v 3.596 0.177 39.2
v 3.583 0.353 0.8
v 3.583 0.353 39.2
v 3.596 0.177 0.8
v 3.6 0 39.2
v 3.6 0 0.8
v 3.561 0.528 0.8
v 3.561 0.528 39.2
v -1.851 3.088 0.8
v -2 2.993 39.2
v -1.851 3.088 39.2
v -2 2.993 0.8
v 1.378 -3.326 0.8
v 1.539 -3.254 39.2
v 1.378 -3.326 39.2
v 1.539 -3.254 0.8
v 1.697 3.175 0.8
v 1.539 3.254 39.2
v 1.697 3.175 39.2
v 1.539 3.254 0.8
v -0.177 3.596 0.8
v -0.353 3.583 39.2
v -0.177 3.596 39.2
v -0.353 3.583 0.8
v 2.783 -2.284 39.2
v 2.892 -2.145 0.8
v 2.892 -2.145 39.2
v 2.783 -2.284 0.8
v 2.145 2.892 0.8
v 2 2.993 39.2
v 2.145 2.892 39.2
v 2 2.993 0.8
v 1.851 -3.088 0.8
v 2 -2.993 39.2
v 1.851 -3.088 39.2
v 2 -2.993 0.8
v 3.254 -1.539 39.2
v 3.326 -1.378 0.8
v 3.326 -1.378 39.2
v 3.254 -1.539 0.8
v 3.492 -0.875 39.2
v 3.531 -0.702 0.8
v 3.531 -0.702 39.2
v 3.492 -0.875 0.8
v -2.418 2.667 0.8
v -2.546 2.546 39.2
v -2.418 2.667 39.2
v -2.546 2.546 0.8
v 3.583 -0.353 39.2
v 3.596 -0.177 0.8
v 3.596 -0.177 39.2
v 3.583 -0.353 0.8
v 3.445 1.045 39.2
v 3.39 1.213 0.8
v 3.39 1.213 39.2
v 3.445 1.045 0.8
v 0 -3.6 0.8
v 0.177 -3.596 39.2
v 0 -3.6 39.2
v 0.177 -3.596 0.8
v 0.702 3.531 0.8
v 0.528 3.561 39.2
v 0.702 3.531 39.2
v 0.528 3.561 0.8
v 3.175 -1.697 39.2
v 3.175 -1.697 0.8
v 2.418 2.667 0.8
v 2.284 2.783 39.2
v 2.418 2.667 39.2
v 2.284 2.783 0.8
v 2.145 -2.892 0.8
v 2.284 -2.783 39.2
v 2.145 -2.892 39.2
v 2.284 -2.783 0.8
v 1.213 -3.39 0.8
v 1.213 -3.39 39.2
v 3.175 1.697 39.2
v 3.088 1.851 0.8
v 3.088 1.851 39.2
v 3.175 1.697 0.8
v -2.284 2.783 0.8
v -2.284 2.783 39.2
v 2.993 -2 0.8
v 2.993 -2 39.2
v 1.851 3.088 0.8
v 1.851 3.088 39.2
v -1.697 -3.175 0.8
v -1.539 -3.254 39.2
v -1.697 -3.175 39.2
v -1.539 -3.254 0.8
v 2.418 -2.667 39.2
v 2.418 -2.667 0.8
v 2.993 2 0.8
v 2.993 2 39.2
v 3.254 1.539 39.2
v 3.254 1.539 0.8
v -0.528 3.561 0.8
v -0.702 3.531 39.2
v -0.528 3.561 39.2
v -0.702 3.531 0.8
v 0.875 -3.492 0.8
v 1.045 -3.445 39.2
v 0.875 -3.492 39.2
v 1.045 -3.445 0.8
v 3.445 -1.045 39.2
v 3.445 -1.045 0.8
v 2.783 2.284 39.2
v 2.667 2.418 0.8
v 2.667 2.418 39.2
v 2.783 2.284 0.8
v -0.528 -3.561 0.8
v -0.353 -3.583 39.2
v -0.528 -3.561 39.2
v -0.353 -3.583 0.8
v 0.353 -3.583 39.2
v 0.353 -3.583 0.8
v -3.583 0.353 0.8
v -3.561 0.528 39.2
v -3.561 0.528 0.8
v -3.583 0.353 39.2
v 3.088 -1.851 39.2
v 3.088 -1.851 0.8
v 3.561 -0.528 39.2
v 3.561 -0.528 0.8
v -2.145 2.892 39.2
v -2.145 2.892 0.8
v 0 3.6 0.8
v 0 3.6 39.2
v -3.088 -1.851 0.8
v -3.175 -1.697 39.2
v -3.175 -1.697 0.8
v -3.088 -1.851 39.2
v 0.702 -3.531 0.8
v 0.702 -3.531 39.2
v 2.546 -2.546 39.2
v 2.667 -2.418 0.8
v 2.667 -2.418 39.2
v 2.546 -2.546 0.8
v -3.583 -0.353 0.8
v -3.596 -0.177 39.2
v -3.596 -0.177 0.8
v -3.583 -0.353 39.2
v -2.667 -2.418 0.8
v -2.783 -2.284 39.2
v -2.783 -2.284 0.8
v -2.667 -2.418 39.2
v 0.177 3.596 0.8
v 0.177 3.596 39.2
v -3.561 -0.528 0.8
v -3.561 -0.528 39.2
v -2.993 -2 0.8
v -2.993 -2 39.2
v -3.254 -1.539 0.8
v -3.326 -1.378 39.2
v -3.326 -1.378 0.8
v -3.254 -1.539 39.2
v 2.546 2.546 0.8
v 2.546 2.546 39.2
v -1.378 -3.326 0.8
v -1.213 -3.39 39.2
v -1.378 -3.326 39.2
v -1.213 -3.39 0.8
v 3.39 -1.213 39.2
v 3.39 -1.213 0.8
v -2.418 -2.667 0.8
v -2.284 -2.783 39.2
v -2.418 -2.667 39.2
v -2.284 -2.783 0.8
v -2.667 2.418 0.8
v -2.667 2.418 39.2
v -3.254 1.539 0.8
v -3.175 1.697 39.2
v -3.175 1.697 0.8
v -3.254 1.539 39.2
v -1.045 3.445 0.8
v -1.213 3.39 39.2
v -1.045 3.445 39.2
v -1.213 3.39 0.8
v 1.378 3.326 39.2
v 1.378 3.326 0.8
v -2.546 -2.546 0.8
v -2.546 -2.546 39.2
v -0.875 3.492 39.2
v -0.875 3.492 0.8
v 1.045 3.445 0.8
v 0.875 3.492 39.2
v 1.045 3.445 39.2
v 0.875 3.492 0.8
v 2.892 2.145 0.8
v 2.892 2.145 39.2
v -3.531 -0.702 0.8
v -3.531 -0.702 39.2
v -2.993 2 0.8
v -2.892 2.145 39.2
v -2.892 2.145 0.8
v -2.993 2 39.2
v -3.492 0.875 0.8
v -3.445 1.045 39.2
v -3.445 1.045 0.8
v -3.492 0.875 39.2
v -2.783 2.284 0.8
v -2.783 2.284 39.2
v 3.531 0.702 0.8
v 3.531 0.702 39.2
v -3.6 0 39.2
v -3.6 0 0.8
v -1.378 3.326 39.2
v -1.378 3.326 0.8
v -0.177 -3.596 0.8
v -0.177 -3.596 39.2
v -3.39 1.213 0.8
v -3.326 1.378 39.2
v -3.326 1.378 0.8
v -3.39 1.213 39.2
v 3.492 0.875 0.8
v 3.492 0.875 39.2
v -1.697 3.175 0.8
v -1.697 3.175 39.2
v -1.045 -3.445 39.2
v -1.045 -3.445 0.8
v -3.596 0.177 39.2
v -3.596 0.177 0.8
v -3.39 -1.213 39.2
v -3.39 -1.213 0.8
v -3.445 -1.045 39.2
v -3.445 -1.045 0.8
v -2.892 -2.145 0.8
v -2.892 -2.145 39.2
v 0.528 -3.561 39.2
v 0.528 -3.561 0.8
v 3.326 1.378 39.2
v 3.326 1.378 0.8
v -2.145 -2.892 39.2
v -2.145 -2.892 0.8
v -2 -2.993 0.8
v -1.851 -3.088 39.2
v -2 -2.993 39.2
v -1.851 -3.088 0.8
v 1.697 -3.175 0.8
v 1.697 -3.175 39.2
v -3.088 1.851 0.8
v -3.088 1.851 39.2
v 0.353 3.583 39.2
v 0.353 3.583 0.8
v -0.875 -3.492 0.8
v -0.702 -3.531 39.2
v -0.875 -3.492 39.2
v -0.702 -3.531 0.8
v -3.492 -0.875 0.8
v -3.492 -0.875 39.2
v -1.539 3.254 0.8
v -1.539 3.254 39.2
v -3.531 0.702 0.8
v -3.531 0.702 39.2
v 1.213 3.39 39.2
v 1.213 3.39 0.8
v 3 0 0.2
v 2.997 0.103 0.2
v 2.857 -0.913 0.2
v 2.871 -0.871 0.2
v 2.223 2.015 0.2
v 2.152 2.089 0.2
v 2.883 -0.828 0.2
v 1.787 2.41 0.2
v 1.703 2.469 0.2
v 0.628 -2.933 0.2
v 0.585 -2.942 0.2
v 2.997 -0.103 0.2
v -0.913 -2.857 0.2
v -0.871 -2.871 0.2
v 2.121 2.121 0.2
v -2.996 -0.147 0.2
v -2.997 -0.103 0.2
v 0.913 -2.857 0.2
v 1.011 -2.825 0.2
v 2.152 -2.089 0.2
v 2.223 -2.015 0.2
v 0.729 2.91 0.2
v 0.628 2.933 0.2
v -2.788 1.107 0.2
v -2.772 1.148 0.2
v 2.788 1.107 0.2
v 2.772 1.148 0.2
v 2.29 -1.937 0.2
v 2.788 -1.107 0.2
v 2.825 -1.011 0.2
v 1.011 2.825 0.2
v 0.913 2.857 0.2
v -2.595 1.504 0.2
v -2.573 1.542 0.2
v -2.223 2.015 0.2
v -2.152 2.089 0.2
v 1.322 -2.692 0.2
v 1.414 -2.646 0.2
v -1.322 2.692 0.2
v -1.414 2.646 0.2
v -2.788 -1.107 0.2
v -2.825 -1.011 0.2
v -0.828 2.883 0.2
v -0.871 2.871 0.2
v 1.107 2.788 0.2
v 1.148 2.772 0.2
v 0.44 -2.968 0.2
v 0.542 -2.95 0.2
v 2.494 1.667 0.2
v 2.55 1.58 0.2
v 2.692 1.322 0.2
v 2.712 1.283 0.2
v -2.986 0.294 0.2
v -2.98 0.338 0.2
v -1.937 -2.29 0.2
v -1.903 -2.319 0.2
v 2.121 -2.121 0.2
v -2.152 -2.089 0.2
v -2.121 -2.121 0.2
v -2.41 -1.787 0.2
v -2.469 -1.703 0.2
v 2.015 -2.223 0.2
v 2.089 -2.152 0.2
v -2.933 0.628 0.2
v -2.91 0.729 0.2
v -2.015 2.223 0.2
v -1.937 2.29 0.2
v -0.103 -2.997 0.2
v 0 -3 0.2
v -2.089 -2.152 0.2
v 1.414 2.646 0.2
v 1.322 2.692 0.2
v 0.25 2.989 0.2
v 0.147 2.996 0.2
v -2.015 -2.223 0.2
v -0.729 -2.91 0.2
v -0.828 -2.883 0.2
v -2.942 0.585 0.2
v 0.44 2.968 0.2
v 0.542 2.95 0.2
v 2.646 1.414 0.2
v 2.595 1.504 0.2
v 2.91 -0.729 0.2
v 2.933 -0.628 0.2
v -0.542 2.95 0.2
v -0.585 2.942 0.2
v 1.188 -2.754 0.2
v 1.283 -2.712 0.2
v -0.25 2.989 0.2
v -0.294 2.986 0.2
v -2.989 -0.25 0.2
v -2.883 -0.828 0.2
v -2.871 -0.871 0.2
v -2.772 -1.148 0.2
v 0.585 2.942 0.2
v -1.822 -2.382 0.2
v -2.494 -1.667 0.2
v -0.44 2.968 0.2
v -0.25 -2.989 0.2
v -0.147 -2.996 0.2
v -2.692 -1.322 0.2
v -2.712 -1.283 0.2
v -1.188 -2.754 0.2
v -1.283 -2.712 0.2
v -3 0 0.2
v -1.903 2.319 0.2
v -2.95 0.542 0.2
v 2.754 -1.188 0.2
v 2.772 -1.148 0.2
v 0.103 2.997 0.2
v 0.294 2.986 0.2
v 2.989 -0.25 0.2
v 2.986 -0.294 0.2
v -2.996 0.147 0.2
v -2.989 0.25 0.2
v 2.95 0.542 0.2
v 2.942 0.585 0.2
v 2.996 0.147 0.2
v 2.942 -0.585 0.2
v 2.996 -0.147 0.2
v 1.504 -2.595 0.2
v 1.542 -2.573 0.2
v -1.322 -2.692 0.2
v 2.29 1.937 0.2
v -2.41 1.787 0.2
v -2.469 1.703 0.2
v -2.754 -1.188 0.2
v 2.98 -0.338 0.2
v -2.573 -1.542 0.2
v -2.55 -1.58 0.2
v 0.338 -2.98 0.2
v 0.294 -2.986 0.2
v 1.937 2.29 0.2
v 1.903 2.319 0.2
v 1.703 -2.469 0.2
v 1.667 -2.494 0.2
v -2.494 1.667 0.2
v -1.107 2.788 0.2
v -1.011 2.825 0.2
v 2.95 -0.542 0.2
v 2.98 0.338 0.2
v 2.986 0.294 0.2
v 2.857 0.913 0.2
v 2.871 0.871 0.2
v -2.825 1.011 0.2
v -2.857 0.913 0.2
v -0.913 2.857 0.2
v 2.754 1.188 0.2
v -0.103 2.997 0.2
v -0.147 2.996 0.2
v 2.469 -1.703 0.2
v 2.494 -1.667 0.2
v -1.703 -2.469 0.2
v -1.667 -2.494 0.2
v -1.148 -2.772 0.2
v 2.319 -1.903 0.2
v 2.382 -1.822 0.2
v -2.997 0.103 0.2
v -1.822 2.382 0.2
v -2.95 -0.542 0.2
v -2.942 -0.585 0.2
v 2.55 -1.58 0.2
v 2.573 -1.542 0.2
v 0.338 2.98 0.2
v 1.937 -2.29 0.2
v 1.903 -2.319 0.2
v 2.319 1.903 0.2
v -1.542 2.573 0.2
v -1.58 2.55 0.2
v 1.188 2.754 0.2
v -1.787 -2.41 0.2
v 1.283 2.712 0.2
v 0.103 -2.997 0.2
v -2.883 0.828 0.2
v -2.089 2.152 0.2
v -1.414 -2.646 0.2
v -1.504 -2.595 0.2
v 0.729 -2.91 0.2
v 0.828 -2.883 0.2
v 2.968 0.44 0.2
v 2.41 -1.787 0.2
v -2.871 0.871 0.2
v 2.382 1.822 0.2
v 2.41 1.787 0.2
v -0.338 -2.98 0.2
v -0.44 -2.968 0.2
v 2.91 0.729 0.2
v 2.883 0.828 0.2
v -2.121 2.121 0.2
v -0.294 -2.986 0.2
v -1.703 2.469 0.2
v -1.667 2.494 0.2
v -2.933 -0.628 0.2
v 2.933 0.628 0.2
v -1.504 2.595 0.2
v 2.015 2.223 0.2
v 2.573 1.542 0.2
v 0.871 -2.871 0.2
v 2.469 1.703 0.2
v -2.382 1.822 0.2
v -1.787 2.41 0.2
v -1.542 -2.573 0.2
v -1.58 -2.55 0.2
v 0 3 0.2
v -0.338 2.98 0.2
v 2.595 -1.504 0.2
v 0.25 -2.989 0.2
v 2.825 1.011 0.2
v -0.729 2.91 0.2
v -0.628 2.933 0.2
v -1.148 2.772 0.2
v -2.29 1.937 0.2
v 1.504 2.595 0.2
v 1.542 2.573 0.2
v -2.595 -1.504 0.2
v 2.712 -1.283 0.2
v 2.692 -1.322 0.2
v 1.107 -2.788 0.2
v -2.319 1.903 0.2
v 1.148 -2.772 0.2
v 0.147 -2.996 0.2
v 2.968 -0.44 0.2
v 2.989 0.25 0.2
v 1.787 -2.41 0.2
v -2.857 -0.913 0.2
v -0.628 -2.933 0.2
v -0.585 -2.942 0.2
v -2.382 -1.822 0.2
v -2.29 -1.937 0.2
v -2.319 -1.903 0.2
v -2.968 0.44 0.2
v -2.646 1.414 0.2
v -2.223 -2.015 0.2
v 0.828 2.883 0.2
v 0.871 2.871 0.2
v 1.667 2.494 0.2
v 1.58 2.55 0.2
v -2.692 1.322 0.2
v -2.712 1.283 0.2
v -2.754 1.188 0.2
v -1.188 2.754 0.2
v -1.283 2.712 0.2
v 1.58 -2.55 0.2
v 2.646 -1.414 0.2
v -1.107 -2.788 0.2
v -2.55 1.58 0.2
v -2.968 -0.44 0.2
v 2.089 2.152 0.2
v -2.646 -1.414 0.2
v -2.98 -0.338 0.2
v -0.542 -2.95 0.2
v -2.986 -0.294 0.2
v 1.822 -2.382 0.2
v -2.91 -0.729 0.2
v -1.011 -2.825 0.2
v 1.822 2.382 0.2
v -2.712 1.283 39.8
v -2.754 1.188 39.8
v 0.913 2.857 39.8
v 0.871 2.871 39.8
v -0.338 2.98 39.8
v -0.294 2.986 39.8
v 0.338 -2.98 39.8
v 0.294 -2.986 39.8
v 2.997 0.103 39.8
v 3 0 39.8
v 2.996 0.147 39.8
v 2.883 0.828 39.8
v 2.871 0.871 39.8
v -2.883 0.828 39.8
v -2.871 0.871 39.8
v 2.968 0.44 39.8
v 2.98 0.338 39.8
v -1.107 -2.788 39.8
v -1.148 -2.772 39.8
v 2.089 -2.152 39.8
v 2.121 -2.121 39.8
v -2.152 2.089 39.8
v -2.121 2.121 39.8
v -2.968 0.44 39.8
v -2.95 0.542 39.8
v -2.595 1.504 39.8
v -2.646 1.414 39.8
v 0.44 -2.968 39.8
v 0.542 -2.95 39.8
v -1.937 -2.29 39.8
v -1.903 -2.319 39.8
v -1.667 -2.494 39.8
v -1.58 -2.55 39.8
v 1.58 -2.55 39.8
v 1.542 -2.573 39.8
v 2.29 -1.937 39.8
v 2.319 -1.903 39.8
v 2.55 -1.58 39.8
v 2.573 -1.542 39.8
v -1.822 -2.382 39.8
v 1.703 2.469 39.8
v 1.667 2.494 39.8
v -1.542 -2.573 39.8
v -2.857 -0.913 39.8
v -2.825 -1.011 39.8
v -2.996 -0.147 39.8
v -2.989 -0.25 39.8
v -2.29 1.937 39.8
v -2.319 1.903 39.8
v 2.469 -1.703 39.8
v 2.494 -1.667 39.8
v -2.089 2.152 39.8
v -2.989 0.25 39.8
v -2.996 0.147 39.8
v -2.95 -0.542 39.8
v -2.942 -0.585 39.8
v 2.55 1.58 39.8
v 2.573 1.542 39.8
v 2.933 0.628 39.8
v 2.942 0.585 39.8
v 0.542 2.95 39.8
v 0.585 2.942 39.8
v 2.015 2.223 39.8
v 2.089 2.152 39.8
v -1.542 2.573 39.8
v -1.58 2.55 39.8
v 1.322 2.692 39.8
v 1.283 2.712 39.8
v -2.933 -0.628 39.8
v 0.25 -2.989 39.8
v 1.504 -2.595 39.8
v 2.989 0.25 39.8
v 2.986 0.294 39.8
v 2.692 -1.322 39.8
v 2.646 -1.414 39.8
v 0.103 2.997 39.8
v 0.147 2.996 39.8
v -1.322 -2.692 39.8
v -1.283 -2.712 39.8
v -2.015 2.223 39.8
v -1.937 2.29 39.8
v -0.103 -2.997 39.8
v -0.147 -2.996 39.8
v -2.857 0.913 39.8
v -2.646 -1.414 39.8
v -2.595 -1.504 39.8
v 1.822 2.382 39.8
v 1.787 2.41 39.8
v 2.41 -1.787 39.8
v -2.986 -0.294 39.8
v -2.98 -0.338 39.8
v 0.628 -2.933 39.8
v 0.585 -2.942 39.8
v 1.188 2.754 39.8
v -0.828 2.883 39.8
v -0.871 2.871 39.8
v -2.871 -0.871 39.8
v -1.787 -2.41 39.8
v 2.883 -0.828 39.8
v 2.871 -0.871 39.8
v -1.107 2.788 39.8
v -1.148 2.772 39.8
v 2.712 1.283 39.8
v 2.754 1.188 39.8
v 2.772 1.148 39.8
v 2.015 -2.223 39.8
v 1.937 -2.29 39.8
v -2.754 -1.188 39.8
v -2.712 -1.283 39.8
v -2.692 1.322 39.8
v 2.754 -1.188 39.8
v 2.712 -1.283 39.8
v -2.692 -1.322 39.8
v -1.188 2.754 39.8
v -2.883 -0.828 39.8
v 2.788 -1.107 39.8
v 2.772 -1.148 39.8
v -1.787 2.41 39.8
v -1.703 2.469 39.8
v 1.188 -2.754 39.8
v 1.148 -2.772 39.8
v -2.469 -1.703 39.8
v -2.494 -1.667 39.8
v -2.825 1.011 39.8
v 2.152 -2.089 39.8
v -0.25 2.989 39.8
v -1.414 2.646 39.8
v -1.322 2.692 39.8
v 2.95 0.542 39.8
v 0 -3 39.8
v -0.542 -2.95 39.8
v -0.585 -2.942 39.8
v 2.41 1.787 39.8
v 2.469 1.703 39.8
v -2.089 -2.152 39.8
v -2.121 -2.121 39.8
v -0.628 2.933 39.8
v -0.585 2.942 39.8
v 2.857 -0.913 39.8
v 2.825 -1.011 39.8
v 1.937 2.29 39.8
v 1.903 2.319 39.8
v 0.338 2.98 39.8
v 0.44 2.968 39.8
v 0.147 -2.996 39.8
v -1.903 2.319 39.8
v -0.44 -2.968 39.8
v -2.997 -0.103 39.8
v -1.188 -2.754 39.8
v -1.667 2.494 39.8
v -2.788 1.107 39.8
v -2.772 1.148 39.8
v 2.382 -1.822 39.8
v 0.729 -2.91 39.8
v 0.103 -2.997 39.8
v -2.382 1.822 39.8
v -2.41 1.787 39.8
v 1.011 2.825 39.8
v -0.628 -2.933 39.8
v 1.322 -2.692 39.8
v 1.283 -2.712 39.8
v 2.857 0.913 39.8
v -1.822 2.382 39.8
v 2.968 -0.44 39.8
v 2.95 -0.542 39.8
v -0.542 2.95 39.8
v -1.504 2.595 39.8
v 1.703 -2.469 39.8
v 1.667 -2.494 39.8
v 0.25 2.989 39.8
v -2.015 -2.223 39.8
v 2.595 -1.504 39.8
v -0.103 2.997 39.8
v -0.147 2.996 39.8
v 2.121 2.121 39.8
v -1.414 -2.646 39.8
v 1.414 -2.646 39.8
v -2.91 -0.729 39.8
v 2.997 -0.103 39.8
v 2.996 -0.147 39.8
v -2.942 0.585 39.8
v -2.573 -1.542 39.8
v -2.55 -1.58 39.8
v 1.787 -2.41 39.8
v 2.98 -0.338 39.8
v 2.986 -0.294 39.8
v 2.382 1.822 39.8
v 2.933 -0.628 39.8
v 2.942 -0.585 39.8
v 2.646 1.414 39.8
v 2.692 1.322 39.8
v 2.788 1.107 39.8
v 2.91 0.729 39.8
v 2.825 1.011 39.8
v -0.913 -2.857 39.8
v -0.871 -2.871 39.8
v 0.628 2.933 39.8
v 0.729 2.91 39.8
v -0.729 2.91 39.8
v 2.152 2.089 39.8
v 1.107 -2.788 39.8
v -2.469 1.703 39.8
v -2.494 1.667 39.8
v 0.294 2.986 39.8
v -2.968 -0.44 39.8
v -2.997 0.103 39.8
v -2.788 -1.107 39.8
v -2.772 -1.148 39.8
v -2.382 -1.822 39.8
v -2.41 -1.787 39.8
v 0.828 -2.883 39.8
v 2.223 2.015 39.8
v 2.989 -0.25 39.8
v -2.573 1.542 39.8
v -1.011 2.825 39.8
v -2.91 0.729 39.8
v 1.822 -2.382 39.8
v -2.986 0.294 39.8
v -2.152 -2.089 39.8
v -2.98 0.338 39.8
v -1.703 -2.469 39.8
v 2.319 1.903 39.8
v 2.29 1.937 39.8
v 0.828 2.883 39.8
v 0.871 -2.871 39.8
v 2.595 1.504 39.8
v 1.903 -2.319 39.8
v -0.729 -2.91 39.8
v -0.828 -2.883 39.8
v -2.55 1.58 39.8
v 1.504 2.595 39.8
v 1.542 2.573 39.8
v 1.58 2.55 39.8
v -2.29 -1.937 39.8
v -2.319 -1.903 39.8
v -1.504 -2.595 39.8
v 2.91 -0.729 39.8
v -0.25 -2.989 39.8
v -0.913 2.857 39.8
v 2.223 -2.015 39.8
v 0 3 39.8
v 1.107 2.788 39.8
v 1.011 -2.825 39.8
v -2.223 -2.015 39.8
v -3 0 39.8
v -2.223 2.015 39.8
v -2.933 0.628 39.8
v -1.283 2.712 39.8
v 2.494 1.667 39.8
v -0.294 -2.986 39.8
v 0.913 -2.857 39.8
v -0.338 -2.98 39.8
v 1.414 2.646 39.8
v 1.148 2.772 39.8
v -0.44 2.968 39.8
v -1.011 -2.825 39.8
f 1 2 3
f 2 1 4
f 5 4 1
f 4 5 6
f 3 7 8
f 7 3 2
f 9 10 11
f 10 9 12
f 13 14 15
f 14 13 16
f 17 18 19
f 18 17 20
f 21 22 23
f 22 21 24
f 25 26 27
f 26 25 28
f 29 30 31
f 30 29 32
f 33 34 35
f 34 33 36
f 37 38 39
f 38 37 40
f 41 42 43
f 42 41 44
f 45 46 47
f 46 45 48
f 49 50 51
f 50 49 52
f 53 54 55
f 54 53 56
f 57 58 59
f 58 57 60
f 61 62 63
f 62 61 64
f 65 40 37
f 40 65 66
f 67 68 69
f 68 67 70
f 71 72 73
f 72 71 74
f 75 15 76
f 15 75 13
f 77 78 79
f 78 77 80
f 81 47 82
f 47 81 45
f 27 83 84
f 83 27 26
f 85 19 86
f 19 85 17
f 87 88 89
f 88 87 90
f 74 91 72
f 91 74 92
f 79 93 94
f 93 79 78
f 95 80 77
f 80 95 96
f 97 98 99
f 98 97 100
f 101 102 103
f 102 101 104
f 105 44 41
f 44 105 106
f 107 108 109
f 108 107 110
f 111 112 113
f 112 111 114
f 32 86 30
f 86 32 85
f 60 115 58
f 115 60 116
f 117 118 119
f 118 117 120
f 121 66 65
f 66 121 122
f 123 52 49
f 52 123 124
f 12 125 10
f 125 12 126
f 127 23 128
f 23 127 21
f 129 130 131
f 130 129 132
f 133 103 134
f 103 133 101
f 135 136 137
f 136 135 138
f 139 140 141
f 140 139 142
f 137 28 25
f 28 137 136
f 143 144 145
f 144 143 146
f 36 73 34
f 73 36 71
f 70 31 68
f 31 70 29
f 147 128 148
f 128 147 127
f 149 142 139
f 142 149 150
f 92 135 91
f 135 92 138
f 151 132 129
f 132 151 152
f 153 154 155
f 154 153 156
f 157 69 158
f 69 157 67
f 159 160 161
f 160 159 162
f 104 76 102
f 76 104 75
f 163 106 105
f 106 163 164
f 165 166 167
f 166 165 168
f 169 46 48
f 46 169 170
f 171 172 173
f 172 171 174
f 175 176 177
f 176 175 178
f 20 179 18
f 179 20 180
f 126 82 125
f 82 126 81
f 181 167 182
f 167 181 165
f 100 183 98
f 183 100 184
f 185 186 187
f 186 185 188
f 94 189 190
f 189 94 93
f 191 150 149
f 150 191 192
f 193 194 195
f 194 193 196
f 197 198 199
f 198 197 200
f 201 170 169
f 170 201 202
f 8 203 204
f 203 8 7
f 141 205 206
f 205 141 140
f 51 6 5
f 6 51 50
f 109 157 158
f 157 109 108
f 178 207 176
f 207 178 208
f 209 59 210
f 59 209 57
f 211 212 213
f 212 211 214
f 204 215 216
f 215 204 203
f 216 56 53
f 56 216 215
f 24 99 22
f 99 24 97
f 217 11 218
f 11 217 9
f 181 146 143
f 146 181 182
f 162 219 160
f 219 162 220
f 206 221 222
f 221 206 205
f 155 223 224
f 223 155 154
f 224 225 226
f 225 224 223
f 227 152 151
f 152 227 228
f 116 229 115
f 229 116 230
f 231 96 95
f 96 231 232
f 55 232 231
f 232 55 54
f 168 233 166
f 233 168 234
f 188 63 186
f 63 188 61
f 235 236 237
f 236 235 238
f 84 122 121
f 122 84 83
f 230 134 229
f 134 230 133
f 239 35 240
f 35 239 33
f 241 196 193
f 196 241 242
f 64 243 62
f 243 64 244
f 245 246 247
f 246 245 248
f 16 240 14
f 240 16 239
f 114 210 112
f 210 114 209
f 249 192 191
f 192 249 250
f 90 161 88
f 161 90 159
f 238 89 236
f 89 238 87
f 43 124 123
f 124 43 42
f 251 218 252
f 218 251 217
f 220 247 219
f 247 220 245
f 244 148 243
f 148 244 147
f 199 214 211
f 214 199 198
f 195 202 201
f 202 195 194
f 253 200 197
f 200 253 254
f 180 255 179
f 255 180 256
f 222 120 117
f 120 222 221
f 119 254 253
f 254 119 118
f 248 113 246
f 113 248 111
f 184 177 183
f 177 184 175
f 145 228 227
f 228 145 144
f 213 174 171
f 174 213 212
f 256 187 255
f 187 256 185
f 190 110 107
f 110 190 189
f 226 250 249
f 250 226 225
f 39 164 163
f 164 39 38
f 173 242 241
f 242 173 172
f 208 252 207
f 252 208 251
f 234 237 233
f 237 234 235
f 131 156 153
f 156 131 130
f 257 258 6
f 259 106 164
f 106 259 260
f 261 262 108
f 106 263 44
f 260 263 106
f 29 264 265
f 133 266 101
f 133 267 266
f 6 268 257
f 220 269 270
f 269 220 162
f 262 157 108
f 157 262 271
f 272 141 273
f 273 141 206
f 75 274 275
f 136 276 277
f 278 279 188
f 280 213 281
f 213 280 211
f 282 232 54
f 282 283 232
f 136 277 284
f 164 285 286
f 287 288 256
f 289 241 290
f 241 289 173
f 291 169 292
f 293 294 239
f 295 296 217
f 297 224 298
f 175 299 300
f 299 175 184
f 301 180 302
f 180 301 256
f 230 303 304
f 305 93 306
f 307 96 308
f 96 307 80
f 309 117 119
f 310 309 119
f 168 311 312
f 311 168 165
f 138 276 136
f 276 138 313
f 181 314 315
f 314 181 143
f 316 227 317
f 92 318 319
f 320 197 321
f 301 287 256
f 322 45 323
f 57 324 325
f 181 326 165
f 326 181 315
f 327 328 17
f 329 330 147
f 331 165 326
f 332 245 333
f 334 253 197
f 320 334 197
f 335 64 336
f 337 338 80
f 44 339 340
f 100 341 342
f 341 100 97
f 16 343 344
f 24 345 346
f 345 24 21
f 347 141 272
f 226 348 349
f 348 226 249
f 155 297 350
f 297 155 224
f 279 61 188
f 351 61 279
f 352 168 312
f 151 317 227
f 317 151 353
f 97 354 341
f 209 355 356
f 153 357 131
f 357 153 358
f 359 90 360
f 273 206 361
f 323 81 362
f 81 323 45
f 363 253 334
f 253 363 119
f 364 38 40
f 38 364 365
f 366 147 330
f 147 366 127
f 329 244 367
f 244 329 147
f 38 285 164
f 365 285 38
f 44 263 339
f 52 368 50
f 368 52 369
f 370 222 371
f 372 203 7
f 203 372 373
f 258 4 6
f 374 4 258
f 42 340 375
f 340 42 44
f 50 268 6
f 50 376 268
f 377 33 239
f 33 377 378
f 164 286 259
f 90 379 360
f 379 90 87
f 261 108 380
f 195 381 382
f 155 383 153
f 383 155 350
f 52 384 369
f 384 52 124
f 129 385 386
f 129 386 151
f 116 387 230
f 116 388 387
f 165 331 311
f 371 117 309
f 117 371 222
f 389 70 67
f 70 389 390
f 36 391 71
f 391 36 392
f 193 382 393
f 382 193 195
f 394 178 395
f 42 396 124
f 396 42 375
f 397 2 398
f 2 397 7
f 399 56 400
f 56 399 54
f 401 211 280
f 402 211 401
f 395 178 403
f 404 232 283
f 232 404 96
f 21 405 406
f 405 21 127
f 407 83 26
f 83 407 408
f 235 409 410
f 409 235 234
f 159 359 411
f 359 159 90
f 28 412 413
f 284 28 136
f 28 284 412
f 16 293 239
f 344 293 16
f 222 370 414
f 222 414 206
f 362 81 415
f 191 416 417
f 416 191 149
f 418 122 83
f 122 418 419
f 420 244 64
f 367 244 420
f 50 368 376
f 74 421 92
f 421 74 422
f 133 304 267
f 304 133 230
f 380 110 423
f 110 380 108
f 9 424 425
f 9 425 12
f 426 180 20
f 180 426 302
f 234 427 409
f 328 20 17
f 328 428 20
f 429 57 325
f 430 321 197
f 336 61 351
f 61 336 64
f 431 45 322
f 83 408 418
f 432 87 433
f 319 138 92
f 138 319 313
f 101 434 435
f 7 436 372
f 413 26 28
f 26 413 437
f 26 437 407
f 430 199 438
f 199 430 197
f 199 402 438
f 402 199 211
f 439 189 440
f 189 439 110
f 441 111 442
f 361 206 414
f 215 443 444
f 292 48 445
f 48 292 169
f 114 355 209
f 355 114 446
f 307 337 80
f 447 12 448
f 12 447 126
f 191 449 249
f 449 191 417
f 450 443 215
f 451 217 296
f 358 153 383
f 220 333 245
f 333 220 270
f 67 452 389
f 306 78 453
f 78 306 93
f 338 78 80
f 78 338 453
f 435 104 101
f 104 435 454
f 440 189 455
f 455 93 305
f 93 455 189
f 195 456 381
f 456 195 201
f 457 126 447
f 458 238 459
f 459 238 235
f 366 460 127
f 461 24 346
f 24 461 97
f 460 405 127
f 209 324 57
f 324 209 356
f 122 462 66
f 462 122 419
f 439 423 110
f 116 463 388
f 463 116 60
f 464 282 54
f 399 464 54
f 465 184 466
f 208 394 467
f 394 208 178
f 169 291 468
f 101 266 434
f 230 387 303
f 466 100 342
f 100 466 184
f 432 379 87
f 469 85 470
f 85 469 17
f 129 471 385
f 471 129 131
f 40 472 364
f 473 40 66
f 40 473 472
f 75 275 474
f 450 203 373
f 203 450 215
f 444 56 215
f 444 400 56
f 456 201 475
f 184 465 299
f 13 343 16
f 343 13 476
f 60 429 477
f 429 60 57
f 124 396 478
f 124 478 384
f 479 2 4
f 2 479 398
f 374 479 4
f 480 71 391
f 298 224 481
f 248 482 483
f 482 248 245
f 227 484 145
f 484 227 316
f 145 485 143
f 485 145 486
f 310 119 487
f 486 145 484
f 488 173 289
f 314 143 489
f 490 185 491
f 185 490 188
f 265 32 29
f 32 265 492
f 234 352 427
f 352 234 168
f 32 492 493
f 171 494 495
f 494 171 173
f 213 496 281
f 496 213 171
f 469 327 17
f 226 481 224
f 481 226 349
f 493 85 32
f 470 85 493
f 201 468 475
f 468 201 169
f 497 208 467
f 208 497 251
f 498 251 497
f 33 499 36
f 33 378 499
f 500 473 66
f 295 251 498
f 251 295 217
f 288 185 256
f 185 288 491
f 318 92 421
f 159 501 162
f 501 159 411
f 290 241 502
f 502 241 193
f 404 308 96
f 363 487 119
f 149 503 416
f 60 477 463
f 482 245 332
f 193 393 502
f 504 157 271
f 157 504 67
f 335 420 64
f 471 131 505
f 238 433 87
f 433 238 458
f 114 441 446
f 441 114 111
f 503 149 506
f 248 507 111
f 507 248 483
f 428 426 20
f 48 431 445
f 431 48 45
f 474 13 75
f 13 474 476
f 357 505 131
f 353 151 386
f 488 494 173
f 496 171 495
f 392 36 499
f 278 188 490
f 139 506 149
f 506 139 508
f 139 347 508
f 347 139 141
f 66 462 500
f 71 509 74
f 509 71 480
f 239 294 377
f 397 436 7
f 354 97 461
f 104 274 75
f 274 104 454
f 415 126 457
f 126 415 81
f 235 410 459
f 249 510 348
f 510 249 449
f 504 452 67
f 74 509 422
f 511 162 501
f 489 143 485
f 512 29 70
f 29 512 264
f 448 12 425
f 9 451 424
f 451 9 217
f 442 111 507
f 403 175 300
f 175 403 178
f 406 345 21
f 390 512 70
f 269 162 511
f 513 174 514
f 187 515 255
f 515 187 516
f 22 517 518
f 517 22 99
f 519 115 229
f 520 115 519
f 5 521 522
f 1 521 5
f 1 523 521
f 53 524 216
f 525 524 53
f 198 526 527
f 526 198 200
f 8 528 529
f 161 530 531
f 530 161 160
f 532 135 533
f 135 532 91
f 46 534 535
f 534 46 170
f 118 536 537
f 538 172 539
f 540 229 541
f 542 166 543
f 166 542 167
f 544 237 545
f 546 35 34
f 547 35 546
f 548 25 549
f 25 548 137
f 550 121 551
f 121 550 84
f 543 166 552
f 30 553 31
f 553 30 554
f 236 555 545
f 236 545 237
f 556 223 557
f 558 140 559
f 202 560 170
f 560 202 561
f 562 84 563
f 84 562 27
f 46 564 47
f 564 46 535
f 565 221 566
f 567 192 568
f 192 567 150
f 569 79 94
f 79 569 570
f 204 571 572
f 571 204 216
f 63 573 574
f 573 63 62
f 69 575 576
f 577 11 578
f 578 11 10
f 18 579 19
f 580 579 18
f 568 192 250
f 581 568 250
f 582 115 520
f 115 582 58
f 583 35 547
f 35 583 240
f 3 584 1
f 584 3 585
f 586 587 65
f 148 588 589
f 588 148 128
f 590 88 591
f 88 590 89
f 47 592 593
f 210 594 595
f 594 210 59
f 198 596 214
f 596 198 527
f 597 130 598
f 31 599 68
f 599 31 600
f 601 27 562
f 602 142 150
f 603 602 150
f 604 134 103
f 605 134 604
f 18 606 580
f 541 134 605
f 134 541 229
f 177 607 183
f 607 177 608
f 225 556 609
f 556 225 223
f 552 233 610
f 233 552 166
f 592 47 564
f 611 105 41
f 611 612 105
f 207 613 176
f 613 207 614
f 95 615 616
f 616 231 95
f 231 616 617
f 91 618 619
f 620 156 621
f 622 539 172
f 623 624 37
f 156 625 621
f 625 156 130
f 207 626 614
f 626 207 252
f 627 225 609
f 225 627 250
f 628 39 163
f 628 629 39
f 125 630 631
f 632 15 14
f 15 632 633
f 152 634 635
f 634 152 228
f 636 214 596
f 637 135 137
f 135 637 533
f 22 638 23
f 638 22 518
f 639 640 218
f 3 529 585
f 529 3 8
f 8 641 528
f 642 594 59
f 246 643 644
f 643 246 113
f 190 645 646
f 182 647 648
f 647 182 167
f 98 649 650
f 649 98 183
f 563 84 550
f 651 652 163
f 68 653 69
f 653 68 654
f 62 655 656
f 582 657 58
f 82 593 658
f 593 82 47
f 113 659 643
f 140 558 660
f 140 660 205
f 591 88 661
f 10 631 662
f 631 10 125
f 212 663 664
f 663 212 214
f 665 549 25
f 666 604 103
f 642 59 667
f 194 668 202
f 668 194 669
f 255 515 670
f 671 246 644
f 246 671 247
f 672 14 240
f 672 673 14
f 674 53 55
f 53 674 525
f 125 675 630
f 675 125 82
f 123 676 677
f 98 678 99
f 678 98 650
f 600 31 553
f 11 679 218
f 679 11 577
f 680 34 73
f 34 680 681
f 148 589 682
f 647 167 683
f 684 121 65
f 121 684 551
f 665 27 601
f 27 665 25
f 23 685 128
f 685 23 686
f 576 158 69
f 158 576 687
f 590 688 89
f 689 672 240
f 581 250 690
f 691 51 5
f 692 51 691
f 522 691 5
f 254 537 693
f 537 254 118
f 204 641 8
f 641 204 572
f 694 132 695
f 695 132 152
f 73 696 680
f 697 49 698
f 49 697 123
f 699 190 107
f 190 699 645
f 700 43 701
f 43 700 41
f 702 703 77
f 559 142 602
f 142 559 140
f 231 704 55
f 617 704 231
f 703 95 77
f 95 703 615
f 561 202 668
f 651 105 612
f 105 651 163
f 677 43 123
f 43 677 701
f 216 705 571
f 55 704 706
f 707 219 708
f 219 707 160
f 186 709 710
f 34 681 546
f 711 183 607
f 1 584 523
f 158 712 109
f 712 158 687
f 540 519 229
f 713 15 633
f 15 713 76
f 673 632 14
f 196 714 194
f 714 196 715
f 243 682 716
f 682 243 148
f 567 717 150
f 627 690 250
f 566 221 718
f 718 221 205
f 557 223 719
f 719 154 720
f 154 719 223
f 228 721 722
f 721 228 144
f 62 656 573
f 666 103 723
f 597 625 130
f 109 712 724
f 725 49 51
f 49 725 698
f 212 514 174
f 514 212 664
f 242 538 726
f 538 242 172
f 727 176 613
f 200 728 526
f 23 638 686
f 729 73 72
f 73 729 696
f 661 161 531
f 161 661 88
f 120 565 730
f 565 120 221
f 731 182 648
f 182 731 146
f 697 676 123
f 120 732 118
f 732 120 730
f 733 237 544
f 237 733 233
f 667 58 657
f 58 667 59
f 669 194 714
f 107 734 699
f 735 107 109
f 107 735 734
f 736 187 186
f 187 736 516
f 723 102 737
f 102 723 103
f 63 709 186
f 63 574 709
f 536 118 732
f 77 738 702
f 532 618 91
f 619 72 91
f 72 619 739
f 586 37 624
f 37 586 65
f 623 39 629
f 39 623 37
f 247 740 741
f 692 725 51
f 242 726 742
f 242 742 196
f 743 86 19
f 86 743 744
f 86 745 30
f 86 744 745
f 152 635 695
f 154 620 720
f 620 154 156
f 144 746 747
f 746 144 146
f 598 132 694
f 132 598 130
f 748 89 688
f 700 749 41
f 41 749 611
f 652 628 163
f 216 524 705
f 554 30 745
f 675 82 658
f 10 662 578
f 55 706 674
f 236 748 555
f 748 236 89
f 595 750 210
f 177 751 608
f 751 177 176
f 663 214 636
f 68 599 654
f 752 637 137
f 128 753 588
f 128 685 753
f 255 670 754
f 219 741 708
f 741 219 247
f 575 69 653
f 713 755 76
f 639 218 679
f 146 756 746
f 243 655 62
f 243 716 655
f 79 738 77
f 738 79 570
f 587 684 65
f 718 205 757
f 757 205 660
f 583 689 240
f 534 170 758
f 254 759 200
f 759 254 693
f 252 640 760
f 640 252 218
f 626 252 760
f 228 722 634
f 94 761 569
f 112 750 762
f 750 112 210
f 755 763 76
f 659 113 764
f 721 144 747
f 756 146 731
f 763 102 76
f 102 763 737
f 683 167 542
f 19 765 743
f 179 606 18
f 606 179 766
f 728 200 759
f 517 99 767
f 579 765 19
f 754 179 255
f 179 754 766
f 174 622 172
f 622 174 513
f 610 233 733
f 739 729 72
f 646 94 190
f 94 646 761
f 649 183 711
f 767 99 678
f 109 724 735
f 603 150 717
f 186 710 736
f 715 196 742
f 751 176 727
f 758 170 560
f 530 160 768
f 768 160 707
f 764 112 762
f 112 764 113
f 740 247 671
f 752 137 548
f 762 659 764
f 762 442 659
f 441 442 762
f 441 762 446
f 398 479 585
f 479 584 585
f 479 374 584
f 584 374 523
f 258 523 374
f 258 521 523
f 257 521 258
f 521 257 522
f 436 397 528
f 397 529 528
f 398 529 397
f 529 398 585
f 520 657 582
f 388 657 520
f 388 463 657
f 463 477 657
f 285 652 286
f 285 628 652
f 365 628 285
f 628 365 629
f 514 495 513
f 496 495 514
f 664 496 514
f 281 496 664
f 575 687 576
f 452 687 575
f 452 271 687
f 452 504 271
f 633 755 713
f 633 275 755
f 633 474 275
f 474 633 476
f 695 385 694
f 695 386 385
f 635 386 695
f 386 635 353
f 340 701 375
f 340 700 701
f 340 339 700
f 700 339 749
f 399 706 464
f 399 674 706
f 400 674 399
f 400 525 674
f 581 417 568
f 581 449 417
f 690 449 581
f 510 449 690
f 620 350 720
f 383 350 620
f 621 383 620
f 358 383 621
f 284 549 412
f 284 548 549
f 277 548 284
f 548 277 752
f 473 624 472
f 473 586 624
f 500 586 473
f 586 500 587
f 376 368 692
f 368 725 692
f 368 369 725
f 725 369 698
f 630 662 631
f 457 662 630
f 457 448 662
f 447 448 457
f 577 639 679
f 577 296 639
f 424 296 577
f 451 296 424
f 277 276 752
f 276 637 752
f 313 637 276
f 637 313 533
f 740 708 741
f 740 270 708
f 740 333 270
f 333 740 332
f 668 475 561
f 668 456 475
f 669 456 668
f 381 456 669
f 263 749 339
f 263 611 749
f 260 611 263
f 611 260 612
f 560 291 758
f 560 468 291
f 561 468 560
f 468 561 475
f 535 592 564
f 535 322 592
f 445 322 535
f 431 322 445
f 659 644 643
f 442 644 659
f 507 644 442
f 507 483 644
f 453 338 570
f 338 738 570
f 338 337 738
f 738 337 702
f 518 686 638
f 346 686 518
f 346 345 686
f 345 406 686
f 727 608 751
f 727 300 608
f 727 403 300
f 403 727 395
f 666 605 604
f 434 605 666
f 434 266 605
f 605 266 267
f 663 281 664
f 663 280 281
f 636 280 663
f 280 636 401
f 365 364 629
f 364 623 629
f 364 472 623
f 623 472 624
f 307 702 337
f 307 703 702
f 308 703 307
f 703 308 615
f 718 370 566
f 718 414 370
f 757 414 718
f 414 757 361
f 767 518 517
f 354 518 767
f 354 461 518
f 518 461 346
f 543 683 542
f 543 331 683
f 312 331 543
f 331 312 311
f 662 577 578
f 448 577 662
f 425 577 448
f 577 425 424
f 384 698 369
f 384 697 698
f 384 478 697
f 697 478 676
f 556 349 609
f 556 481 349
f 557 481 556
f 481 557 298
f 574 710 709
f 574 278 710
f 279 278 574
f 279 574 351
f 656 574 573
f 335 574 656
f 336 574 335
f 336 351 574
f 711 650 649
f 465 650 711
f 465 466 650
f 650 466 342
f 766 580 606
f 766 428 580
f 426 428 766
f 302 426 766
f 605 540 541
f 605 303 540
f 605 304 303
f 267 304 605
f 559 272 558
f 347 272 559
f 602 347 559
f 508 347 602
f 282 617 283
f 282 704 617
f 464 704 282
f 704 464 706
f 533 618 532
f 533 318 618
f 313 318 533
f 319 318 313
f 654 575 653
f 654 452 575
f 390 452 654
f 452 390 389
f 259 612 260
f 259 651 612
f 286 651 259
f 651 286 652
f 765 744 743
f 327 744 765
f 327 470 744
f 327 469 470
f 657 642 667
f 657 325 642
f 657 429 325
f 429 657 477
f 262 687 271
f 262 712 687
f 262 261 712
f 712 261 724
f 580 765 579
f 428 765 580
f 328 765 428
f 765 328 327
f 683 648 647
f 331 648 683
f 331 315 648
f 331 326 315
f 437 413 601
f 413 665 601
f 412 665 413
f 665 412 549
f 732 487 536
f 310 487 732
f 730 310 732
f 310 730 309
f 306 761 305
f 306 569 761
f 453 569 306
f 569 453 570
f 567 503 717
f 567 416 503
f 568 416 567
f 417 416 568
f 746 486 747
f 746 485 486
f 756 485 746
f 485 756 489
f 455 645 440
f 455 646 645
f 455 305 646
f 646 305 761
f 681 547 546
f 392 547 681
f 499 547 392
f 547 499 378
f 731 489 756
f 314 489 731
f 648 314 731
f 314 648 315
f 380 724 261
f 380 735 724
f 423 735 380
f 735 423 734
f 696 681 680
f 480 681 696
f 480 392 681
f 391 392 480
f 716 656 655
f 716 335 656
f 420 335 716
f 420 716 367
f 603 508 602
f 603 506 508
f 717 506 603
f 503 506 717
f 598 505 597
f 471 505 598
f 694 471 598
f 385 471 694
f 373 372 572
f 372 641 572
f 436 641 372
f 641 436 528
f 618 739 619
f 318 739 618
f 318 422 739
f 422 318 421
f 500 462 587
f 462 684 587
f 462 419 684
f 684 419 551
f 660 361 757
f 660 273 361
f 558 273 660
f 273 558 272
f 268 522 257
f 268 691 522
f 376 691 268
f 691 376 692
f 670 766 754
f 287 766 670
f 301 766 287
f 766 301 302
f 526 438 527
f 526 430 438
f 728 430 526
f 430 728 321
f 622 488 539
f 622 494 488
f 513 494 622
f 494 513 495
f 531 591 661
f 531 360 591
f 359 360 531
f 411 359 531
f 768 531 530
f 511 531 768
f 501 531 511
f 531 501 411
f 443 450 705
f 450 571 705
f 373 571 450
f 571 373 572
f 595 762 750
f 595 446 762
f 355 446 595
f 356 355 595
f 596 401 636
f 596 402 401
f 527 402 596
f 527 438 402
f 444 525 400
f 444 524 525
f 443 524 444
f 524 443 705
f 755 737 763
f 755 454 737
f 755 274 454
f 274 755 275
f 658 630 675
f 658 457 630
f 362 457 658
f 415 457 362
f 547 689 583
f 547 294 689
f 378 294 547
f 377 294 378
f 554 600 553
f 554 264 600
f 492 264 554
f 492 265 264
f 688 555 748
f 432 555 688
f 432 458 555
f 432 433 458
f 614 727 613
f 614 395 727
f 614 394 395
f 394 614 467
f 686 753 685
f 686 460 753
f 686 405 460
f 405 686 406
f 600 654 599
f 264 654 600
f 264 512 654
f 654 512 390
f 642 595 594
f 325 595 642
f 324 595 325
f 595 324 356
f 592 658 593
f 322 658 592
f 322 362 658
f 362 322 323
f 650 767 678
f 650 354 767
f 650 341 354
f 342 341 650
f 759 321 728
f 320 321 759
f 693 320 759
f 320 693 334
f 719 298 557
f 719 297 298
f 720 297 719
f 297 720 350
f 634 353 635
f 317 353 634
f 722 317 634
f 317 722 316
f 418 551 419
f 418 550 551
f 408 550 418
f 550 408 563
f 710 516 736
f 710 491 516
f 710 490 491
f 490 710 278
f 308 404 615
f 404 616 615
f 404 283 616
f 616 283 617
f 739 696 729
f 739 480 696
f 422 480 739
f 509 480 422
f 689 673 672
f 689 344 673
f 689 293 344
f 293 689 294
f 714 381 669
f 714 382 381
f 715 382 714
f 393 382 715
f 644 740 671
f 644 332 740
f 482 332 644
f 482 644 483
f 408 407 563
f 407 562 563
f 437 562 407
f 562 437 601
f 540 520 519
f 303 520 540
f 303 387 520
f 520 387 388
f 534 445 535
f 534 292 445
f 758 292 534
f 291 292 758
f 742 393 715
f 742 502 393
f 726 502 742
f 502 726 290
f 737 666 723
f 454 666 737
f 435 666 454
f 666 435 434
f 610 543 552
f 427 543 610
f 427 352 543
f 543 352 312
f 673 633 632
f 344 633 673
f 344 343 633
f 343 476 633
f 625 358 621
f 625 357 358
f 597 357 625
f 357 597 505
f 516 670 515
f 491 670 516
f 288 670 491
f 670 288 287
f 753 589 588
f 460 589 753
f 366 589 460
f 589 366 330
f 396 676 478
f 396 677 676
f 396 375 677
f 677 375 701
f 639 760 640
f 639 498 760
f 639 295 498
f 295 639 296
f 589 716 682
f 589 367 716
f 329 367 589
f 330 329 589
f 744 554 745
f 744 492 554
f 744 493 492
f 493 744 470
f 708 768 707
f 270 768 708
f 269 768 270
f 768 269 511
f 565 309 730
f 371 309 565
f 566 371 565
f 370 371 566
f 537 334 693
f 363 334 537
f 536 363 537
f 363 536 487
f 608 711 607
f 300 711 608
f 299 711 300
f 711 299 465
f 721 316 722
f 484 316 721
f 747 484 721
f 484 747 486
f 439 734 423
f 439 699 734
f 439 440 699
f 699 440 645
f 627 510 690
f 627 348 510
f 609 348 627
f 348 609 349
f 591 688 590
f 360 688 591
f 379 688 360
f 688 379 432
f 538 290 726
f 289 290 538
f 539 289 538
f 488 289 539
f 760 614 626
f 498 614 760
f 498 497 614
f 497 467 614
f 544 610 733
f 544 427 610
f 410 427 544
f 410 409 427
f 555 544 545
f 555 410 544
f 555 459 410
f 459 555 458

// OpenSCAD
$fn=128;

// Heatshrink sleeving (tubing) parameters
inner_d = 6;          // inner diameter (mm)
wall = 0.6;           // wall thickness (mm)
length = 40;          // length (mm)
chamfer = 0.8;        // end chamfer length (mm)

outer_d = inner_d + 2*wall;

module heatshrink_sleeve(id=inner_d, od=outer_d, h=length, c=chamfer) {
    difference() {
        // Outer body with slight end chamfers
        union() {
            // Main cylinder
            translate([0,0,c])
                cylinder(d=od, h=max(0.01, h-2*c));

            // Bottom chamfer
            if (c > 0)
                cylinder(d1=od-2*c, d2=od, h=c);

            // Top chamfer
            if (c > 0)
                translate([0,0,h-c])
                    cylinder(d1=od, d2=od-2*c, h=c);
        }

        // Inner bore (slightly extended to ensure clean subtraction)
        translate([0,0,-0.5])
            cylinder(d=id, h=h+1);
    }
}

heatshrink_sleeve();
